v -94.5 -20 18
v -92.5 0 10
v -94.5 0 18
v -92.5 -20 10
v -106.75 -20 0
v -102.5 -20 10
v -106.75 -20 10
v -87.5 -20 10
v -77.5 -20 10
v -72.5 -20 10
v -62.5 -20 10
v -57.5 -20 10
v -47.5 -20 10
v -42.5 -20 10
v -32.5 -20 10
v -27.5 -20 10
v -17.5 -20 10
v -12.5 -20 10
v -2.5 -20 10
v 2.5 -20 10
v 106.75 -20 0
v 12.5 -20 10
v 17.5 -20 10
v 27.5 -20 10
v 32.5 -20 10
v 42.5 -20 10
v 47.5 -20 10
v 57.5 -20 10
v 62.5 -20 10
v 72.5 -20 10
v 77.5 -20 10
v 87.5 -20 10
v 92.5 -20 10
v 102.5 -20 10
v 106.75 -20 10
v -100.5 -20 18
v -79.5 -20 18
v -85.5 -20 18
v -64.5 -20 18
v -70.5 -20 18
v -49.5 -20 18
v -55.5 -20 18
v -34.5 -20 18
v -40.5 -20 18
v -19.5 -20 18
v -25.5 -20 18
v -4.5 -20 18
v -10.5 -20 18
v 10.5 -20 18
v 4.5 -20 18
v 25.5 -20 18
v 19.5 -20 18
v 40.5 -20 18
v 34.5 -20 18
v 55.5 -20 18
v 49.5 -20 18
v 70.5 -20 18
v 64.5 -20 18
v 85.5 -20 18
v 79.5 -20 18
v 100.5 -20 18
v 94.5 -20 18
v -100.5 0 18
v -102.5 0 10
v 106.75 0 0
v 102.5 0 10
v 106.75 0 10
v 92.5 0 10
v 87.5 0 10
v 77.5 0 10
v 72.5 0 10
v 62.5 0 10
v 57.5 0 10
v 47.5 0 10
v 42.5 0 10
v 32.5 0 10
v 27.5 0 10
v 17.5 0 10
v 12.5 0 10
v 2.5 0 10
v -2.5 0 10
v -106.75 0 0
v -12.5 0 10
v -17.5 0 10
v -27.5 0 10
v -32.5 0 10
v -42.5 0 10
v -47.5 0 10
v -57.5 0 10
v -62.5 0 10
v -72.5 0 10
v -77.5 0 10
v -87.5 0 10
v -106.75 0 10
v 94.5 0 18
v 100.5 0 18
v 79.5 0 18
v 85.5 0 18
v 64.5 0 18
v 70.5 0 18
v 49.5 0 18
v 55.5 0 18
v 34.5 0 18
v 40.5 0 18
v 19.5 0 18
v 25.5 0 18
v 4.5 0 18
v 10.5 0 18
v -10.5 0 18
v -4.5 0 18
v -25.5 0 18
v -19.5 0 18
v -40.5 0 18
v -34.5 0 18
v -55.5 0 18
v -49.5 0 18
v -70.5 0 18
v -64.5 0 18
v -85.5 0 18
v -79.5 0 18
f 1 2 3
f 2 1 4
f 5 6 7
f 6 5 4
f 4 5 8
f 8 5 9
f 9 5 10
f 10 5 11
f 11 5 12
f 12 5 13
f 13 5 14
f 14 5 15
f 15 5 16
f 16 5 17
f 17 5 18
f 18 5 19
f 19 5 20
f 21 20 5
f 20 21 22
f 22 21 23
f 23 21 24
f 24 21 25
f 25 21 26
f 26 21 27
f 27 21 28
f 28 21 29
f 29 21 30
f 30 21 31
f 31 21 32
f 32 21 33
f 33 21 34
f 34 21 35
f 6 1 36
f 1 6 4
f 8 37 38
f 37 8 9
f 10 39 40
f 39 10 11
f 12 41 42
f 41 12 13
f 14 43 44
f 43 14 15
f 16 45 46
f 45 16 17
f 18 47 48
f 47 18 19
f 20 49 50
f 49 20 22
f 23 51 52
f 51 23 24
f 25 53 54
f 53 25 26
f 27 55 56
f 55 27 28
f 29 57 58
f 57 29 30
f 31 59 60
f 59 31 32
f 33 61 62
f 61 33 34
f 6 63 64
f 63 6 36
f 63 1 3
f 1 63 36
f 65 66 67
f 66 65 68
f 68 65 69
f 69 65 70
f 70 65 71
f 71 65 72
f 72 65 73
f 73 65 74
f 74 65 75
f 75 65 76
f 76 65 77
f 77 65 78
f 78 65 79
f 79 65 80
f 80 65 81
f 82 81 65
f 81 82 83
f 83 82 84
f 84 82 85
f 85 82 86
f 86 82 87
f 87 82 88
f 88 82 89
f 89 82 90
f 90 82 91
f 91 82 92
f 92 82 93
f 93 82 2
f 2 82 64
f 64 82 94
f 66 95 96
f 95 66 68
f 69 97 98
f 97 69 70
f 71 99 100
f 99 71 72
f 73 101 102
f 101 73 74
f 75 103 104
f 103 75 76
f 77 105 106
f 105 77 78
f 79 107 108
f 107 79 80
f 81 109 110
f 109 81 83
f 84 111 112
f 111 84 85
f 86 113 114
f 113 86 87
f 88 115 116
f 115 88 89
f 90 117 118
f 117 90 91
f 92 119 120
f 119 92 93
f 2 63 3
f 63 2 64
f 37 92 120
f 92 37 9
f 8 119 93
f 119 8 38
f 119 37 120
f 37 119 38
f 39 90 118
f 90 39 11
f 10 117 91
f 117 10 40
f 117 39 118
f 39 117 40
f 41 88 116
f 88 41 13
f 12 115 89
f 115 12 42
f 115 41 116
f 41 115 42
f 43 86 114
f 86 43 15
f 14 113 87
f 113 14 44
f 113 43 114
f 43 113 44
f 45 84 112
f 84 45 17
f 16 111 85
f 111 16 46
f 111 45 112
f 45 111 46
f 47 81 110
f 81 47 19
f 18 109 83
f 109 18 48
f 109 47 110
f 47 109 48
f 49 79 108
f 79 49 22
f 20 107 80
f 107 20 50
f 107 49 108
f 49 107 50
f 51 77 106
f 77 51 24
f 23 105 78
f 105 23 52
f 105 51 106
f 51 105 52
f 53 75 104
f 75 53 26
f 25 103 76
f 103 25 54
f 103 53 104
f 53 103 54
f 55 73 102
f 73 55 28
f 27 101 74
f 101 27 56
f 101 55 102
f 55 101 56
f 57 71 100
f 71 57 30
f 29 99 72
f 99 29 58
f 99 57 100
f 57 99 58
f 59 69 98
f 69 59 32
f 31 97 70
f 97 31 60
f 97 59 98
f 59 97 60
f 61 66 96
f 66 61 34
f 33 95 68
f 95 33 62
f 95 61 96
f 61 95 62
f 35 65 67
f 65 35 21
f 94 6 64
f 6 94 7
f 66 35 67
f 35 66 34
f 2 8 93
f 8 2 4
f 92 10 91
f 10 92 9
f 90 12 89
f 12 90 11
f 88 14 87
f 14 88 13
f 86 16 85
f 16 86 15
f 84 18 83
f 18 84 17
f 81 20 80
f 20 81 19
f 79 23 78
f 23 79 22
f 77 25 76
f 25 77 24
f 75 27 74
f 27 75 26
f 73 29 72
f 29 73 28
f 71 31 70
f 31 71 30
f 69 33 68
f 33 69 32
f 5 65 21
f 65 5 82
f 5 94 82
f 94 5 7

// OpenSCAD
$fn = 32;

// ----------------------------------------------------------------------
// Toothed rack, 14 teeth
// 15 mm pitch, 8 mm teeth
// ----------------------------------------------------------------------

// --- parameters (mm) ---
bar_w = 20;      // bar width (Y)
seat_tol = 0.1;  // tolerance at the seating features
free_tol = 0.5;  // general tolerance on the free sizes
bar_h = 10;      // bar height (Z)
teeth = 14;      // number of teeth
pitch = 15;      // tooth pitch
tooth_h = 8;     // tooth height above the bar
root_w = 10.5;   // tooth width at the root
crest_w = 6;     // tooth width at the crest

// --- derived feature positions (mm) ---
span = (teeth - 1) * pitch;  // = 195   distance between the outer teeth
bar_l = span + root_w + 8;   // = 213.5   bar length: teeth plus 4 mm at each end
tooth_x = -span / 2;         // = -97.5   X of the first tooth
height = bar_h + tooth_h;    // = 18   overall height
feature_centers = [
  [tooth_x + 0 * pitch, -bar_w / 2],
  [tooth_x + 1 * pitch, -bar_w / 2],
  [tooth_x + 2 * pitch, -bar_w / 2],
  [tooth_x + 3 * pitch, -bar_w / 2],
  [tooth_x + 4 * pitch, -bar_w / 2],
  [tooth_x + 5 * pitch, -bar_w / 2],
  [tooth_x + 6 * pitch, -bar_w / 2],
  [tooth_x + 7 * pitch, -bar_w / 2],
  [tooth_x + 8 * pitch, -bar_w / 2],
  [tooth_x + 9 * pitch, -bar_w / 2],
  [tooth_x + 10 * pitch, -bar_w / 2],
  [tooth_x + 11 * pitch, -bar_w / 2],
  [tooth_x + 12 * pitch, -bar_w / 2],
  [tooth_x + 13 * pitch, -bar_w / 2]
];   // tooth centre line, drives the tooth loop

// bar with a rack of teeth, one extruded trapezoium per centre
module rack_tooth() {
  linear_extrude(height = bar_w)
    polygon(points = [
      [0, 0],
      [root_w, 0],
      [root_w / 2 + crest_w / 2, tooth_h + 1],
      [root_w / 2 - crest_w / 2, tooth_h + 1]
    ]);
}

union() {
  translate([-bar_l / 2, -bar_w, 0]) cube([bar_l, bar_w, bar_h]);
  for (centre = feature_centers)
    translate([centre[0] - root_w / 2, 0, bar_h - 1]) rotate([90, 0, 0]) rack_tooth();
}
